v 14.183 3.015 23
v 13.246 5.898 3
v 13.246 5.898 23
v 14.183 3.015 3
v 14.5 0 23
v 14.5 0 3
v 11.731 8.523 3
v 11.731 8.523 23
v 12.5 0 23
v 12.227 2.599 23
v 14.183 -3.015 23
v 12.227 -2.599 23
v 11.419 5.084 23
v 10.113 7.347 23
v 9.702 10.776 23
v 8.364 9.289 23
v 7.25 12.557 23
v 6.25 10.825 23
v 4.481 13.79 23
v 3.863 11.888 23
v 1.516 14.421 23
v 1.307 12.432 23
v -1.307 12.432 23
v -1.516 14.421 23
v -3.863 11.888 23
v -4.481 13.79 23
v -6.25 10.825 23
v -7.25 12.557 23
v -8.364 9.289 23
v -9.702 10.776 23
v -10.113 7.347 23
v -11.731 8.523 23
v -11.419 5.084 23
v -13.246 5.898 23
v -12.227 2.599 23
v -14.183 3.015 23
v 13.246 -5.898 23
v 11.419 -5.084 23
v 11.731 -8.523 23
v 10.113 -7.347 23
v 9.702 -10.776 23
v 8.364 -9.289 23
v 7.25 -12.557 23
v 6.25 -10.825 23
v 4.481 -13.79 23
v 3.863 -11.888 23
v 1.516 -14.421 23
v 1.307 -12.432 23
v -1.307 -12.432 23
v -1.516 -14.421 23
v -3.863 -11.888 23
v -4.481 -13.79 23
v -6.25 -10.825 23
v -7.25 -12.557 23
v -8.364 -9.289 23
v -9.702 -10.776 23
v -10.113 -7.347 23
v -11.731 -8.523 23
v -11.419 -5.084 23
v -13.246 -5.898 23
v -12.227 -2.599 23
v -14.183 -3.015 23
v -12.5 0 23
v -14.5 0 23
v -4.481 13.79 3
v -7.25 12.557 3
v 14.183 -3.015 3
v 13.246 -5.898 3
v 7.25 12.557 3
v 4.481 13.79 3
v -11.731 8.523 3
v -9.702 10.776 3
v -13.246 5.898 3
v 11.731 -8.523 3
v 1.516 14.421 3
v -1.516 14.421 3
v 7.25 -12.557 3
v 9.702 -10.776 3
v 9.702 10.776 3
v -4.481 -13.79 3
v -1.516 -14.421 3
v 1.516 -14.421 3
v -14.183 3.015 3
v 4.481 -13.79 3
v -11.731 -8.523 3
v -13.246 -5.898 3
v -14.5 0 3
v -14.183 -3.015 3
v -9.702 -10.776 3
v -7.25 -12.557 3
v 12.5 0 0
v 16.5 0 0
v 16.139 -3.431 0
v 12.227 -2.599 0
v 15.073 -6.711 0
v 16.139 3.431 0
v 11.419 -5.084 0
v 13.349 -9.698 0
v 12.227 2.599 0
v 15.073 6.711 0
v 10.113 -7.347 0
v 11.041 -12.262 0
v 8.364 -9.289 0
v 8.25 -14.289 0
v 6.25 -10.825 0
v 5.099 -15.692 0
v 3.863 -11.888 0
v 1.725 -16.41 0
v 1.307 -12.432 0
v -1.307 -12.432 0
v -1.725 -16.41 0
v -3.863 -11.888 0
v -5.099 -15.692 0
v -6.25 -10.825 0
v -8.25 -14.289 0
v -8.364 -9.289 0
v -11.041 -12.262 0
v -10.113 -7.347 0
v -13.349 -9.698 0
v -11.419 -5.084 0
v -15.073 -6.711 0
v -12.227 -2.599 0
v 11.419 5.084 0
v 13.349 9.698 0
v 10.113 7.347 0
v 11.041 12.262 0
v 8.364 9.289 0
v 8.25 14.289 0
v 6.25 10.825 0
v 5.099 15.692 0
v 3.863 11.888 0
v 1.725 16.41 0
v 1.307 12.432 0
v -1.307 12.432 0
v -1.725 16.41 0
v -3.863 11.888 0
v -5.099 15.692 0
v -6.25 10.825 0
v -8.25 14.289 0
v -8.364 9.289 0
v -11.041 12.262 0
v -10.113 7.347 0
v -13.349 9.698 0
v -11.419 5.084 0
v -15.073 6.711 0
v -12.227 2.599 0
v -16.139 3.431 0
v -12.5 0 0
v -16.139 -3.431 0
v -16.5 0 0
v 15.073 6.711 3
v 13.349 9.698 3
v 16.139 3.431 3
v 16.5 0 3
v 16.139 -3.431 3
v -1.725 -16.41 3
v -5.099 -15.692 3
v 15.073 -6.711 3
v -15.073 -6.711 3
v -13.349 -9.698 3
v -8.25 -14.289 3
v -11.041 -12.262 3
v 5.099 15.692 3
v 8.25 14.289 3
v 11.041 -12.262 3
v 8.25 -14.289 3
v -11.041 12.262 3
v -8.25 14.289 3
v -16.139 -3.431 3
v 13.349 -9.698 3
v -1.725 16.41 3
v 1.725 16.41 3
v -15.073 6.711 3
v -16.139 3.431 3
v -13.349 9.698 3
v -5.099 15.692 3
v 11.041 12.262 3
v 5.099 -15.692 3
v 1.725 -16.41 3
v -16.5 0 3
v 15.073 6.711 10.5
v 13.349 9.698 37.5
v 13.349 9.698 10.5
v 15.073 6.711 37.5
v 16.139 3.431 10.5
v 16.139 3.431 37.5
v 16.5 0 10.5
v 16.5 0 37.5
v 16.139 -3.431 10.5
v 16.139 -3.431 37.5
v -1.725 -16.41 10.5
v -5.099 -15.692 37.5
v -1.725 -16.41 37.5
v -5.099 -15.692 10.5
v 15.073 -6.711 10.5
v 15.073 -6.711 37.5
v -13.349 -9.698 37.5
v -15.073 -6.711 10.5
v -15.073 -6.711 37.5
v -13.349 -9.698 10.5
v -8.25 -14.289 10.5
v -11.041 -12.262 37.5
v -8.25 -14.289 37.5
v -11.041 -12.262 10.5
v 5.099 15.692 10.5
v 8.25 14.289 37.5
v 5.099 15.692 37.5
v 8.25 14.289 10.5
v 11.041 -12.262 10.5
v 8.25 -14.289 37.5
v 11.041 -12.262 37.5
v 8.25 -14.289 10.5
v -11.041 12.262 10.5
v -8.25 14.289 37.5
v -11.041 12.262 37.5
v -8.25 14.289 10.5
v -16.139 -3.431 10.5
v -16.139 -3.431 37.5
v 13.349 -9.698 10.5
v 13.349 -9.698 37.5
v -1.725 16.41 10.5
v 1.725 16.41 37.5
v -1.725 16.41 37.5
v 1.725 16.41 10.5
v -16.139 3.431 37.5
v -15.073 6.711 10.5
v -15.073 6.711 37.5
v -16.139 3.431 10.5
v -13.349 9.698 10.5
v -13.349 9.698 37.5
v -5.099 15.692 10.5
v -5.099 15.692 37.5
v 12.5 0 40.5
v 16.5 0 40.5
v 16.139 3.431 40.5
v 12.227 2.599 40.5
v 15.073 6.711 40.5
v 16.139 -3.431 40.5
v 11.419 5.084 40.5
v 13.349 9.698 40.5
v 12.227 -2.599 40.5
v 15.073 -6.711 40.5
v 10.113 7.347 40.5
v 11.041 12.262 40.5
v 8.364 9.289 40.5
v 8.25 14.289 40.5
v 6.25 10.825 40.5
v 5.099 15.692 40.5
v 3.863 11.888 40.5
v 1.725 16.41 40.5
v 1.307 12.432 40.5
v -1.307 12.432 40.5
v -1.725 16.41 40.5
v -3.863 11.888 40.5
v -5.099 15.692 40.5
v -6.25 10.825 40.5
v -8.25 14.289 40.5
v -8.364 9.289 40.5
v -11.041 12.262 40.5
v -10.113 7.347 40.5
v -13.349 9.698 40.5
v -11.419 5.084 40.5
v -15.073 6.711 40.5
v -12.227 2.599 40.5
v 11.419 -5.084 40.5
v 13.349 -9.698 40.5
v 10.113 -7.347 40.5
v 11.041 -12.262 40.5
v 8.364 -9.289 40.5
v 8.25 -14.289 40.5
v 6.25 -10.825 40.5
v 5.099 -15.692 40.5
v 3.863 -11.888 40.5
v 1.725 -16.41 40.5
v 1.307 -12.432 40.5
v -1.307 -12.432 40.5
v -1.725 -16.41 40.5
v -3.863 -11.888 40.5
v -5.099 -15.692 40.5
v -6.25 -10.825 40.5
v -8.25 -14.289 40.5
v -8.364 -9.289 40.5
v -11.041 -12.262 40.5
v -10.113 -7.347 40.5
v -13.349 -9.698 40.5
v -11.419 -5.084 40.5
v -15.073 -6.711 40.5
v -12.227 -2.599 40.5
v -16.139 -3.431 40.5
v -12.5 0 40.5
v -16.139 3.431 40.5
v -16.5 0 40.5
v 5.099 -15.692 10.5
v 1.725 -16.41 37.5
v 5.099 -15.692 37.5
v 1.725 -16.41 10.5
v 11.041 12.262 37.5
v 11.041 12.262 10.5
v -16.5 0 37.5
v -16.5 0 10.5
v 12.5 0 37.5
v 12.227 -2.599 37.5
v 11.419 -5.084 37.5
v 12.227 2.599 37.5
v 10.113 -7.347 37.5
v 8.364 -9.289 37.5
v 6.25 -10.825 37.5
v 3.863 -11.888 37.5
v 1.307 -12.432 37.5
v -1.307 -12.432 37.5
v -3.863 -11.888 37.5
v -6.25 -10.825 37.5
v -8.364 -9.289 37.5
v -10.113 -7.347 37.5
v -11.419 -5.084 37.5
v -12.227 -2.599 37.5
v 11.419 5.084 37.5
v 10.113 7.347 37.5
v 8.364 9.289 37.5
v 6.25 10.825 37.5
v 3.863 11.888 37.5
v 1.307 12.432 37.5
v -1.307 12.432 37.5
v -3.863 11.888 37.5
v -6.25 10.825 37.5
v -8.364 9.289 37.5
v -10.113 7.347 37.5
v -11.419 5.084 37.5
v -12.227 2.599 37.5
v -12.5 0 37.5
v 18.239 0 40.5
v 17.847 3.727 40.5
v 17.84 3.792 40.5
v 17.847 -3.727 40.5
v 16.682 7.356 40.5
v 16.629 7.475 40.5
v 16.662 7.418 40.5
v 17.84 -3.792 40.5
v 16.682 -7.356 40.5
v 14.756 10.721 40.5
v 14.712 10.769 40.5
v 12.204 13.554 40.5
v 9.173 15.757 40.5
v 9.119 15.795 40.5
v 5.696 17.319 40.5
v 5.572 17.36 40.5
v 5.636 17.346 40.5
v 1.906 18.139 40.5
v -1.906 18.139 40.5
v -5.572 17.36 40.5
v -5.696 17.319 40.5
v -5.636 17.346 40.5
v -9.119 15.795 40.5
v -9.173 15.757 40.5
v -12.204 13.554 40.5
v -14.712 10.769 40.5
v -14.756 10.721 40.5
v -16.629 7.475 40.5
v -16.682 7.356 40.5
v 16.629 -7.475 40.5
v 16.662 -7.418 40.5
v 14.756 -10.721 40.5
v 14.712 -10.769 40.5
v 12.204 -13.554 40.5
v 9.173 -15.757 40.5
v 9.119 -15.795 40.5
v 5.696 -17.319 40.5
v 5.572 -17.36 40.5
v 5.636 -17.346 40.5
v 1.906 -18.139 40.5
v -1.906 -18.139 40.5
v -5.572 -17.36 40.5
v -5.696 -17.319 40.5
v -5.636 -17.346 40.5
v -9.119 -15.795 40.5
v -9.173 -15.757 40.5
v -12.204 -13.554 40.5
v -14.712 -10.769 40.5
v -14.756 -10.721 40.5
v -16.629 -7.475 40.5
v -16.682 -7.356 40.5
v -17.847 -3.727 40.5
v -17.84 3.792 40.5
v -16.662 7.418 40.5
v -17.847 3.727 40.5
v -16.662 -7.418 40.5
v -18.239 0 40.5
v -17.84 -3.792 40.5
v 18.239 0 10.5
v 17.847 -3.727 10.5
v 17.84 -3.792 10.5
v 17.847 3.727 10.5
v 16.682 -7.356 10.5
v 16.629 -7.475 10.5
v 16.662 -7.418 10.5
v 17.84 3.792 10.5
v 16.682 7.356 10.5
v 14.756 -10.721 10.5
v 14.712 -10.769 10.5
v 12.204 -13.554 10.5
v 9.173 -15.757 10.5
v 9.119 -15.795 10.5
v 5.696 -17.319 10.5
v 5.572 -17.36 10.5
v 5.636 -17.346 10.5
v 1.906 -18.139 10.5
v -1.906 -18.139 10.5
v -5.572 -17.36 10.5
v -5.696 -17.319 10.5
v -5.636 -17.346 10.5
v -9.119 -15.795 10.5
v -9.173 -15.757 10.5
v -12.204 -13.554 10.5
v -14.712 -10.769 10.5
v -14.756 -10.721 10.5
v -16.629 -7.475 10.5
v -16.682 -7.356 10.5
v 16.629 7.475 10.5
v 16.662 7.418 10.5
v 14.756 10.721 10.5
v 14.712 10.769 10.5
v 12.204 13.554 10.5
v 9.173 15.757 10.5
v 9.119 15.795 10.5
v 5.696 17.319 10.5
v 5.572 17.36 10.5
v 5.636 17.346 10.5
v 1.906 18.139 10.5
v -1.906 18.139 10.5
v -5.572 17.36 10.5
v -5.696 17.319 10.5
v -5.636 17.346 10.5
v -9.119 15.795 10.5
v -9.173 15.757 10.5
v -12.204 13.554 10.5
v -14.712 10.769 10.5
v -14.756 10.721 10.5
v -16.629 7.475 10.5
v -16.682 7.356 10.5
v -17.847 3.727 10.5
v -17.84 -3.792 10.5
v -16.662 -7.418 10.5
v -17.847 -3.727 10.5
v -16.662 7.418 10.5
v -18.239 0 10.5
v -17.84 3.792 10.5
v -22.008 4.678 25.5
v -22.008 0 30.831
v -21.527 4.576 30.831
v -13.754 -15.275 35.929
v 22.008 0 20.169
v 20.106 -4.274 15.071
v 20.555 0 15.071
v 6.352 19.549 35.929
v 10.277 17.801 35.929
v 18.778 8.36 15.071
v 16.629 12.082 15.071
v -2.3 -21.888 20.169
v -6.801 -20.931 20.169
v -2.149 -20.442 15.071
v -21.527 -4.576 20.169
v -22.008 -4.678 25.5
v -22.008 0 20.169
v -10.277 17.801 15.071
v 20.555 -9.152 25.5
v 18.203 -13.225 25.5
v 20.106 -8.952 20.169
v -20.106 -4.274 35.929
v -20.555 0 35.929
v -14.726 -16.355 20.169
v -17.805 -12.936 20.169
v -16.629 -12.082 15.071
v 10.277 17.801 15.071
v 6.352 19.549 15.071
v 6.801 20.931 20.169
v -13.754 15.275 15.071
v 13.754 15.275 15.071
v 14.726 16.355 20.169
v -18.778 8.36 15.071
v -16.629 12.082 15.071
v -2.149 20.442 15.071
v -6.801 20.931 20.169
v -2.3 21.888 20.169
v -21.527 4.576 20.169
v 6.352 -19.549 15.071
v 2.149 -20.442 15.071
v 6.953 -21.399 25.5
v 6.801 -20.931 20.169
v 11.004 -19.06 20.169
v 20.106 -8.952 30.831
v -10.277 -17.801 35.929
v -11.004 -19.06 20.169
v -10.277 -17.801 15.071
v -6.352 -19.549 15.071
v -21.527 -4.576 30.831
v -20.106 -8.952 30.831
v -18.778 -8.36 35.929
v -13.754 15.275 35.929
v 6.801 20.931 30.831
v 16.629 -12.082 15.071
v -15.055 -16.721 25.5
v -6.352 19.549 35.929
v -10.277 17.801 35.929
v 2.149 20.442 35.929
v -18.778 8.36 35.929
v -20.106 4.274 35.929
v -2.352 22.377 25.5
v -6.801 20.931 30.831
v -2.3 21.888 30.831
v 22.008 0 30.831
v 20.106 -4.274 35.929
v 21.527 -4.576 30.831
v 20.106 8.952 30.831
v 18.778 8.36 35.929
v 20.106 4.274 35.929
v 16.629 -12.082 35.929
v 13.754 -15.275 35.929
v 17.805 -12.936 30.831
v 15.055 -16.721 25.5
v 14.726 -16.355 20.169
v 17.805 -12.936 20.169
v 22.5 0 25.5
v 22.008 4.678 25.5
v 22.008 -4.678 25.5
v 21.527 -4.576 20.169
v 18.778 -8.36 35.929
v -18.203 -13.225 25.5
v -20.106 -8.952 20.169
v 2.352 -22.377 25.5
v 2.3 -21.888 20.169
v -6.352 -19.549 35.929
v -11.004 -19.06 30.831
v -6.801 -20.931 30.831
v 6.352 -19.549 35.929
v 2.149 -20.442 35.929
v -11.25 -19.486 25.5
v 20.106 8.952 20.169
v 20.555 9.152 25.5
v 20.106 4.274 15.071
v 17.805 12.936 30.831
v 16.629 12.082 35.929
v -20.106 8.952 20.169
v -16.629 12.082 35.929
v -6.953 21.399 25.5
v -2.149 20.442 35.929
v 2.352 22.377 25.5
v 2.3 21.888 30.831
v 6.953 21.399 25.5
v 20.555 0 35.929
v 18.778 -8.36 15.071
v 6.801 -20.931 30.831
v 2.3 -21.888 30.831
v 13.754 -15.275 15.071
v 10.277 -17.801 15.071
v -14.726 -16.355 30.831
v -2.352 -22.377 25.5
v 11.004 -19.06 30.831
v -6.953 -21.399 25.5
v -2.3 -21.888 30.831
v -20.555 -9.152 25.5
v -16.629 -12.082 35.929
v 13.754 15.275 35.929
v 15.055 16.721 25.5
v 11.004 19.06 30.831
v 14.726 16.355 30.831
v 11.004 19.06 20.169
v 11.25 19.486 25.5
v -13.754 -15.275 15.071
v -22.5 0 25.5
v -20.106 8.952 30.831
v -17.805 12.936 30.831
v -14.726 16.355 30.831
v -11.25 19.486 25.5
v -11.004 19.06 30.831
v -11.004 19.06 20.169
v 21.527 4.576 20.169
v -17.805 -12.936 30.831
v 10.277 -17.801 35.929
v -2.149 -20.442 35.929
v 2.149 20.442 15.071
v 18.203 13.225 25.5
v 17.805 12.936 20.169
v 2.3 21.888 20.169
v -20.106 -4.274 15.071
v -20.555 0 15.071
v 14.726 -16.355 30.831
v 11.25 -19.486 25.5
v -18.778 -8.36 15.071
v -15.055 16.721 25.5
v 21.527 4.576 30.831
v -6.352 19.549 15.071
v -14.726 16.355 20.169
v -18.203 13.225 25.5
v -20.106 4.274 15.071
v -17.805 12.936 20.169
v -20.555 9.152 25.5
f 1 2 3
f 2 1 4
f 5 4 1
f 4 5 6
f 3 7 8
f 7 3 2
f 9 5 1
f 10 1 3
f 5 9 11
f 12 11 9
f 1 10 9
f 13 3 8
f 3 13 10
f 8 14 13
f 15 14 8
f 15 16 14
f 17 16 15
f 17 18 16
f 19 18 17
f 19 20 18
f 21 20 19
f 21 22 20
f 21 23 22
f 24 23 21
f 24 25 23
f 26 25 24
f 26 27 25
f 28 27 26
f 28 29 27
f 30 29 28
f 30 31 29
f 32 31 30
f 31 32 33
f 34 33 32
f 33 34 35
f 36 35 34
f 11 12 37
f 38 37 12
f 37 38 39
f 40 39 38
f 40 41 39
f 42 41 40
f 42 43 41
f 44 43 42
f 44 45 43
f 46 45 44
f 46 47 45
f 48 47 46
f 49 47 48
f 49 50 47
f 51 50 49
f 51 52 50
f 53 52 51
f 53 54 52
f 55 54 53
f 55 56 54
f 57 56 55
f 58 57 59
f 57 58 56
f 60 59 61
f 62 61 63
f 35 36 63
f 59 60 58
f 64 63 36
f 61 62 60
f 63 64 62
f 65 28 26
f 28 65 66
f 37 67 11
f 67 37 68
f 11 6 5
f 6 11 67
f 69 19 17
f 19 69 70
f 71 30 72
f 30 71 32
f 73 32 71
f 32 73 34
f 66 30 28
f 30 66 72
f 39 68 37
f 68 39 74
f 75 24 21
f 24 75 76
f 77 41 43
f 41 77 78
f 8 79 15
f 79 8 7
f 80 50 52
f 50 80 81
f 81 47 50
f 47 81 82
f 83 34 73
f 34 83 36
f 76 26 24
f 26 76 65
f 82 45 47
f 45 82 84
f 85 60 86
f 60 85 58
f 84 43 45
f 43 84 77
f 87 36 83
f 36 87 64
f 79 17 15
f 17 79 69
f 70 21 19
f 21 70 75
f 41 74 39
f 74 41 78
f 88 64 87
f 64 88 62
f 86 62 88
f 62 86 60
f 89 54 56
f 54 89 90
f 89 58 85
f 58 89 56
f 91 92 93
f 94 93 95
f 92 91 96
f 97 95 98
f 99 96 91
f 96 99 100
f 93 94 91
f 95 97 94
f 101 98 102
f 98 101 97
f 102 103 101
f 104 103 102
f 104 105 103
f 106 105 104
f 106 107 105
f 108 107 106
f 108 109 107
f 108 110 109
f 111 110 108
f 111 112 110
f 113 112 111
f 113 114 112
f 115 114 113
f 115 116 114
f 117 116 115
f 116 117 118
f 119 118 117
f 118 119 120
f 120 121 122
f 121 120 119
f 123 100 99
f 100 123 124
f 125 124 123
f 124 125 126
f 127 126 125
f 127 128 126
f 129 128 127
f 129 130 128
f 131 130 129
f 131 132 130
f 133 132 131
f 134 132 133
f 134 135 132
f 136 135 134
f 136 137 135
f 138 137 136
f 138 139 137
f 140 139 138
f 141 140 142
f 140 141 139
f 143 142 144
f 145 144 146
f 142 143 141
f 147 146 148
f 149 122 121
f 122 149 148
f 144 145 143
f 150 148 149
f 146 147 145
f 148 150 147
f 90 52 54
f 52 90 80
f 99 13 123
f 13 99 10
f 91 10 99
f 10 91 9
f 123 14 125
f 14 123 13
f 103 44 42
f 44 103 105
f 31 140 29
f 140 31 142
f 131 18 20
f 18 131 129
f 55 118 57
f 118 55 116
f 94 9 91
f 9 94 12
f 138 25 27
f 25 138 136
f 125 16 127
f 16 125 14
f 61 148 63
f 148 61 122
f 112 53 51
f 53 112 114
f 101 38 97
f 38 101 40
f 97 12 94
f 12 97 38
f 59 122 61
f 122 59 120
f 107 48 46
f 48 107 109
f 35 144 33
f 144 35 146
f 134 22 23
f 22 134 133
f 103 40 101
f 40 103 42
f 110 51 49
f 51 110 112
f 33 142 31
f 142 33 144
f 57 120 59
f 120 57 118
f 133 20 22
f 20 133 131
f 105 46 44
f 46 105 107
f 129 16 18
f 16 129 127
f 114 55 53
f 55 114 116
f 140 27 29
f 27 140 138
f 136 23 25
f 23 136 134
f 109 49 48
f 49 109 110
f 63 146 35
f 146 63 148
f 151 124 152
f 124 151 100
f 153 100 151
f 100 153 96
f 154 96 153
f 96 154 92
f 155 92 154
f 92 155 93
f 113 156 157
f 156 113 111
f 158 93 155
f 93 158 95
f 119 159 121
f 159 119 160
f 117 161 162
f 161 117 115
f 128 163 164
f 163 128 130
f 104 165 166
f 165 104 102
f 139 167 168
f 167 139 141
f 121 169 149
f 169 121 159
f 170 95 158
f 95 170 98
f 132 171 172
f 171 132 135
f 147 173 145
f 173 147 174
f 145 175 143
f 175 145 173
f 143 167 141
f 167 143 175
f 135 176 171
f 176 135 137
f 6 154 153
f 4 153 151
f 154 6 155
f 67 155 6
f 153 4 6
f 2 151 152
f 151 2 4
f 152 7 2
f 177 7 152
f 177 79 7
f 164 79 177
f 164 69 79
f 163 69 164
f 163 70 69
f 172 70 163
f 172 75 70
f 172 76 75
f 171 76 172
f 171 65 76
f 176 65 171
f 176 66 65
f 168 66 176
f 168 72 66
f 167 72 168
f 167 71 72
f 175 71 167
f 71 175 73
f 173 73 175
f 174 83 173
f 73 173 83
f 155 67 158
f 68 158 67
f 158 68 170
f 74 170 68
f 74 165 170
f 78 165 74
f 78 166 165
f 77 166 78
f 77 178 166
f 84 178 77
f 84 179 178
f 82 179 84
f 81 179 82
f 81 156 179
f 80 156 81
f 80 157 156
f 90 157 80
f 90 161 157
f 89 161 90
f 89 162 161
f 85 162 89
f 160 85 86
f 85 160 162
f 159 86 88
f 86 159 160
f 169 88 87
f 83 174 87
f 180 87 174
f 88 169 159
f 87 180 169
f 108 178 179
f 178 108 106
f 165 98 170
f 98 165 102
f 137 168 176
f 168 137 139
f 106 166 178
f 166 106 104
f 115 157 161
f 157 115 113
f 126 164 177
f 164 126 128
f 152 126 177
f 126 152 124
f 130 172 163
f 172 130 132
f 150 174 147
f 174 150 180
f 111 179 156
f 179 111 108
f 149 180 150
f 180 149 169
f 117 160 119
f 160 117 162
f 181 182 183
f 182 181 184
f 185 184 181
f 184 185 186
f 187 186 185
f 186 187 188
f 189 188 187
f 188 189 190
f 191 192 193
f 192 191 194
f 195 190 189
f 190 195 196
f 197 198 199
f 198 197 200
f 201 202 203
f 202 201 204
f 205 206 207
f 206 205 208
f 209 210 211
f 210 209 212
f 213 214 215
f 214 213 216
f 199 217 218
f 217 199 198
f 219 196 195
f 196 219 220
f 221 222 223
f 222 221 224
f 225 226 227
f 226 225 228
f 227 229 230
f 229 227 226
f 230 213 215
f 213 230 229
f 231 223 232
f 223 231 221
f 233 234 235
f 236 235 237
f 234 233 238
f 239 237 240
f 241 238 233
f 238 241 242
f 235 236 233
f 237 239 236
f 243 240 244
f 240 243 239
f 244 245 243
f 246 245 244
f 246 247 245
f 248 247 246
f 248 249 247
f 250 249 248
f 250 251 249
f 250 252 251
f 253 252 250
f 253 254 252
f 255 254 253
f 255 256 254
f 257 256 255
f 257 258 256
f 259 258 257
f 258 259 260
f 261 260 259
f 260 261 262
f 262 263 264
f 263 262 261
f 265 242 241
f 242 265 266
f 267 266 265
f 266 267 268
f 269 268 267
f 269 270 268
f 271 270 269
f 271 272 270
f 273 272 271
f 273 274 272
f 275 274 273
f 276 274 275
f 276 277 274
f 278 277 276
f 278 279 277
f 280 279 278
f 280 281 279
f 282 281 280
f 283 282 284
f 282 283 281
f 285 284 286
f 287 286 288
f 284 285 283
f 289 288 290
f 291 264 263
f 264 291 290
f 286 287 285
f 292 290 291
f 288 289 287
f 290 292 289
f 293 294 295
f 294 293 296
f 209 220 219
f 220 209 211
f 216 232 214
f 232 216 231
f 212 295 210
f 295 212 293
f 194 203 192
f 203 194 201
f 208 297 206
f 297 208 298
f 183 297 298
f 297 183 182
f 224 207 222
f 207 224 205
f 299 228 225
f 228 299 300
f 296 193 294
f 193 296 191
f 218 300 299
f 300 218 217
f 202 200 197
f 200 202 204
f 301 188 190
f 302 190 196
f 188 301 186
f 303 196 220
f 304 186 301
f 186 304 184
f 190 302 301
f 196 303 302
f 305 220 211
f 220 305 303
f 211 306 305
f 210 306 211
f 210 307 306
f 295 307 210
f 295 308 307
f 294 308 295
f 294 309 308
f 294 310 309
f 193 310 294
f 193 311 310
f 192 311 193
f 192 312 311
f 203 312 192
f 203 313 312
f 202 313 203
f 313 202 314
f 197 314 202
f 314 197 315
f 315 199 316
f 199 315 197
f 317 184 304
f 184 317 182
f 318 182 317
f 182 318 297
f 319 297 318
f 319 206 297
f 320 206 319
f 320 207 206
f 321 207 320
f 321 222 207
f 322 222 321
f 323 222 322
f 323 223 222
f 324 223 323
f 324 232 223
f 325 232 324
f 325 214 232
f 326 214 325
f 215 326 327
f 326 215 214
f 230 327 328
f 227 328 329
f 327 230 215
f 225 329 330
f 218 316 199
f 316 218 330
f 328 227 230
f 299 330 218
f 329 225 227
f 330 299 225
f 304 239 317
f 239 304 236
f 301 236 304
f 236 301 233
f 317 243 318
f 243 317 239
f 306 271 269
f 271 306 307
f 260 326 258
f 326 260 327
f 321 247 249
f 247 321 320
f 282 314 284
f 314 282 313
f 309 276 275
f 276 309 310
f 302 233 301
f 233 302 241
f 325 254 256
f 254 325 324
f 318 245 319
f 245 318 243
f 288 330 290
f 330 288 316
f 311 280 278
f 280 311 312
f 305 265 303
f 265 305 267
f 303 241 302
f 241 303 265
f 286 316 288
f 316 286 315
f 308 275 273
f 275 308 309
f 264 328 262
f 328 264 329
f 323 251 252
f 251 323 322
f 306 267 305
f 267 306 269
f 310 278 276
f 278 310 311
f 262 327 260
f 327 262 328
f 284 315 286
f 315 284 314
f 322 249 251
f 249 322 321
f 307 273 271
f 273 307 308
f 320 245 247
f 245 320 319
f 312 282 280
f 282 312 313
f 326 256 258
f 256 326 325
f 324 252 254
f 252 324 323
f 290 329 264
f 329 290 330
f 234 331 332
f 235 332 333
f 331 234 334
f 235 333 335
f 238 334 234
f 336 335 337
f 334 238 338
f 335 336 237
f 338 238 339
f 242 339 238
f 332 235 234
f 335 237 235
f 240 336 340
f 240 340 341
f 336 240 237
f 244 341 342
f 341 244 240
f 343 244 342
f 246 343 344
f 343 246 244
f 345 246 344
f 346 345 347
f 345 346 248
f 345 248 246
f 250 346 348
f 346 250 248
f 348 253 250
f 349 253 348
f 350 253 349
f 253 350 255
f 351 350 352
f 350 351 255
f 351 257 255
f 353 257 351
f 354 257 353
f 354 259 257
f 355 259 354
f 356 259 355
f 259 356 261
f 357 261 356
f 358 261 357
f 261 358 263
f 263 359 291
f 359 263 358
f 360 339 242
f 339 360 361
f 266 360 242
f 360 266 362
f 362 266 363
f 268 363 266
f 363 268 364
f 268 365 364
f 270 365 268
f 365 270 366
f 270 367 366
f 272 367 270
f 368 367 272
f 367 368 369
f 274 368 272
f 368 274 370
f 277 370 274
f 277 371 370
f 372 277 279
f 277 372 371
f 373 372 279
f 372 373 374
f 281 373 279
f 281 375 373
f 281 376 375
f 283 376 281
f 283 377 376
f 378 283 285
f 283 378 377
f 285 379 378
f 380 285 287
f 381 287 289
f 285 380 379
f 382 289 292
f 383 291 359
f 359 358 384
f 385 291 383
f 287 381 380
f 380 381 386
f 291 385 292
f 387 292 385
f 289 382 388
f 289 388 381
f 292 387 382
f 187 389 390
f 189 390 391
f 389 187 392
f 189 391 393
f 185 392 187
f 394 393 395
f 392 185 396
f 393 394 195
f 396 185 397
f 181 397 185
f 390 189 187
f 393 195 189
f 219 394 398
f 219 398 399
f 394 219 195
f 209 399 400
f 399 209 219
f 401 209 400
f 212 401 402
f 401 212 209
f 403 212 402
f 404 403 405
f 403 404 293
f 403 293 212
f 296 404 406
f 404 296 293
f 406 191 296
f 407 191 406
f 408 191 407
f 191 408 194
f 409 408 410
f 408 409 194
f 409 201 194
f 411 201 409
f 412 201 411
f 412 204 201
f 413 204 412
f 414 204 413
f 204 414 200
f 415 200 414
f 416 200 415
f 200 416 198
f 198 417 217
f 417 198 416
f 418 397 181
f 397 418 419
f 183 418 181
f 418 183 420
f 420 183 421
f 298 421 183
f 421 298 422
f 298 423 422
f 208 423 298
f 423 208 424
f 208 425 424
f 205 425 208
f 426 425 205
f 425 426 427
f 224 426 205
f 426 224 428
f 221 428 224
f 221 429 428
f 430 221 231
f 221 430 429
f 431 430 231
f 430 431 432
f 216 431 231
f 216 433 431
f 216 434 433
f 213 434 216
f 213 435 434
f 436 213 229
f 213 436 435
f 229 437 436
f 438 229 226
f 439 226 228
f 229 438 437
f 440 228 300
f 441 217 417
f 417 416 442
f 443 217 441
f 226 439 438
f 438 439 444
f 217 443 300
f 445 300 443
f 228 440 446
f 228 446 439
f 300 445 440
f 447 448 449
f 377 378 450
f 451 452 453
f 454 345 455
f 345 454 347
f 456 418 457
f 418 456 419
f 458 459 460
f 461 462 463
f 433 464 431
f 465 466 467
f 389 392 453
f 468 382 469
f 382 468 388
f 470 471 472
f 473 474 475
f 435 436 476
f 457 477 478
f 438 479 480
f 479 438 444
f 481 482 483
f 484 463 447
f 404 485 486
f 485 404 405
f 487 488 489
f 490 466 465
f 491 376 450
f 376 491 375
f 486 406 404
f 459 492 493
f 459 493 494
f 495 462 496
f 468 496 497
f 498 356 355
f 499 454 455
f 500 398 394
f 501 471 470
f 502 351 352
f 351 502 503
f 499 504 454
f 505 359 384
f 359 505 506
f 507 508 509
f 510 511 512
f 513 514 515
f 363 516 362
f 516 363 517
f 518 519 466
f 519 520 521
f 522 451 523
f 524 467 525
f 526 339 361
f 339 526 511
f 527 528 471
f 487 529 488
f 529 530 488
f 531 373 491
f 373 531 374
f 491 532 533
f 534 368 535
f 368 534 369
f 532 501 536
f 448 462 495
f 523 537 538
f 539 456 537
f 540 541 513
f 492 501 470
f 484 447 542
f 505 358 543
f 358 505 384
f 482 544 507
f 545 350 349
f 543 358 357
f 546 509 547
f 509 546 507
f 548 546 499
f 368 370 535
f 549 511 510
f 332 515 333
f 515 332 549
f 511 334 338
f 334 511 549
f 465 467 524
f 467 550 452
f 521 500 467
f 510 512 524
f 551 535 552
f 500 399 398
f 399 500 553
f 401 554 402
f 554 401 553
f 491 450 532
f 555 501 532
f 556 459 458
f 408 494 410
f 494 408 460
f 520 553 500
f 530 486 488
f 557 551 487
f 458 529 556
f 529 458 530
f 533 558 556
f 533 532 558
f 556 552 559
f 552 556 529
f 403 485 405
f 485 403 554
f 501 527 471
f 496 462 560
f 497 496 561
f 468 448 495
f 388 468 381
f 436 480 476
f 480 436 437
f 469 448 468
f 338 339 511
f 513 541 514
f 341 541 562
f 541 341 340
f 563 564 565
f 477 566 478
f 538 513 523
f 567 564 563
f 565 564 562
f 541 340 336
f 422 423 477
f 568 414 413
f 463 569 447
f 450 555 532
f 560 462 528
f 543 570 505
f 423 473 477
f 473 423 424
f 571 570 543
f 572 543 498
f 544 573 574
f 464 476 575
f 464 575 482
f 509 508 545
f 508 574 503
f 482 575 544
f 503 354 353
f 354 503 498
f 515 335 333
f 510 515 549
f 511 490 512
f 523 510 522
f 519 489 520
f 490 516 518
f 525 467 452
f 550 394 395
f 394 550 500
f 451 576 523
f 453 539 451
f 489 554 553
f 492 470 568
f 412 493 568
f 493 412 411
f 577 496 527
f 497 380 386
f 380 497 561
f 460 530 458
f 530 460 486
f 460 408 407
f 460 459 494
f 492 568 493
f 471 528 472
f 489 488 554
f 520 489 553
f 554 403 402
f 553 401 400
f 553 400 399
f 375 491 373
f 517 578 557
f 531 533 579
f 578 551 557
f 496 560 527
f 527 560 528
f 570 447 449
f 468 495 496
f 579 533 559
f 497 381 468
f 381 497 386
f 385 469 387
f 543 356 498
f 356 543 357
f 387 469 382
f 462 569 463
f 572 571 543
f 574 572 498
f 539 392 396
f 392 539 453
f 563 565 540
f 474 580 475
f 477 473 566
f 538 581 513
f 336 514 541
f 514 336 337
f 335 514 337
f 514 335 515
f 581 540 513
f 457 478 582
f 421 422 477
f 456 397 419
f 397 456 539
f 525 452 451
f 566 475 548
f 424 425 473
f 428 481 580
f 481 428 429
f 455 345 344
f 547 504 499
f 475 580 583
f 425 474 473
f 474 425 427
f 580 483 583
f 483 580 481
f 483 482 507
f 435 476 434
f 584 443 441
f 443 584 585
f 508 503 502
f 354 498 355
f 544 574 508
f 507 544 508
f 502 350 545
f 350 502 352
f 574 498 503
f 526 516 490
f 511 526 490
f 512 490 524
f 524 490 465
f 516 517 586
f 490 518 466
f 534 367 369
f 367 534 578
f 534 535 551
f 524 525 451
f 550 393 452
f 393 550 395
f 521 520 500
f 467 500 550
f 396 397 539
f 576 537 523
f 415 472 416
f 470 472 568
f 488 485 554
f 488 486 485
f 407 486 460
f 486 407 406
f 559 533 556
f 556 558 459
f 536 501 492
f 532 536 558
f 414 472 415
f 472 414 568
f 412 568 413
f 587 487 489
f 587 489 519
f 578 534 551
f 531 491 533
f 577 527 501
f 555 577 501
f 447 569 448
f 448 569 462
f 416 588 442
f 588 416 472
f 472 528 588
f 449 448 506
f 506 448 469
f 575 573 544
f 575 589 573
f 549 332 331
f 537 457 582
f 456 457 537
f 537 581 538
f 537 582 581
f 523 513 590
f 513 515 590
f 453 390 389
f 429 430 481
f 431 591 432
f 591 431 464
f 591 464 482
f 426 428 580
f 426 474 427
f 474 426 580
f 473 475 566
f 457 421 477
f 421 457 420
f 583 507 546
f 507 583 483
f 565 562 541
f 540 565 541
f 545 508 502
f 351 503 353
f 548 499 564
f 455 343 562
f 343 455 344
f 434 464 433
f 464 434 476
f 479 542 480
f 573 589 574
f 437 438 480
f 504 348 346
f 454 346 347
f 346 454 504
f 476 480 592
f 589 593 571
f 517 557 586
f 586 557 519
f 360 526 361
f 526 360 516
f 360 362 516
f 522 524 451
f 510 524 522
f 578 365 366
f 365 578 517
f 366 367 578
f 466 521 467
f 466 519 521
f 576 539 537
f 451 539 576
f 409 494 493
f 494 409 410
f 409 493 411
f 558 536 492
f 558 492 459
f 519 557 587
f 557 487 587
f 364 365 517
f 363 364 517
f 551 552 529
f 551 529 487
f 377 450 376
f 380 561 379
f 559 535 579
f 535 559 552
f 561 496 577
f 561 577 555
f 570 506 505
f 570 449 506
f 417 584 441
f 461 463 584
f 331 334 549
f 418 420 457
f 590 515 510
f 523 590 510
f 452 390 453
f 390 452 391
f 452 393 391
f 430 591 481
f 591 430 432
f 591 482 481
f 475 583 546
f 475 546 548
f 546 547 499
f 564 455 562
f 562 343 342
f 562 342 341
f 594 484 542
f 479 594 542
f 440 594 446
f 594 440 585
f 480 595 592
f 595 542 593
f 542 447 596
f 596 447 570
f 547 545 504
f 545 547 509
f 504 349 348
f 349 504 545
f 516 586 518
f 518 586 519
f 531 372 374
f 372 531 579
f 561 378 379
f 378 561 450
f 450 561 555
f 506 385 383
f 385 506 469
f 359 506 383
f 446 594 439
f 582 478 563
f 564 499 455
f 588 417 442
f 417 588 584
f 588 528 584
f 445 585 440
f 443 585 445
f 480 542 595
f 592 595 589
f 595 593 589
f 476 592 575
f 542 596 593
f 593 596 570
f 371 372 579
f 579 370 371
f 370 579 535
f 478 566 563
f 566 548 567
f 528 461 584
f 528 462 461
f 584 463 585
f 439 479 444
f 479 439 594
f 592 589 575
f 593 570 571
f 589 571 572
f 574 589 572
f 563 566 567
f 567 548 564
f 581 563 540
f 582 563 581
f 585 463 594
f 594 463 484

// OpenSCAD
/*Leone Ermer
Faucet Drinking Fountain
2013 3D Fabrication

Notes:
	Make Faucet Attachment infill normal
	Make Fountain infill zero

To Do List:
	Print
	Make Spout
	Figure out Sizing and Print Controls
*/

//
//Basic Controls
//
	//Display Parts
		faucetAttachment = true;
		fountain = true;

	//Faucet Attachment (Thermochromic PLA)
		faucetDiameter = 25; //Diameter of inner circle
		attachmentHeight = 23;
		attachmentThickness = 2;
		
	//Fountain (Soft PLA)
		fountainHeight = 30;
		fountainWidth = 45;
			
//
//Secondary Controls
//
	//Connecter Ridge
		ridgeThickness = 2;
		ridgeHeight = 3;
	
	
	//Don't Touch
		faucetRadius = (faucetDiameter/2);
		faRadius = (faucetRadius + attachmentThickness);
		ridgeRadius = (faRadius+ ridgeThickness);
		fountainRadius = (fountainWidth/2);
		fountainOval = (fountainHeight + ((fountainHeight)*.7));
		fountainCutoffs = ((fountainHeight*.7)/2);
		
//	
//Build
//

if(faucetAttachment == true){
	faucetAttachment();
	connecterRidge();
}

if(fountain == true){
	translate([0,0,(fountainHeight+fountainCutoffs-ridgeHeight)])
	connecterRidge();
	fountain();
}

//
// Modules
//

module faucetAttachment(){
	difference(){
		cylinder(attachmentHeight,faRadius,faRadius);
		cylinder(attachmentHeight,faucetRadius,faucetRadius);
	}
}

module connecterRidge(){
	difference(){
		cylinder(ridgeHeight,ridgeRadius,ridgeRadius);
		cylinder(ridgeHeight,faucetRadius,faucetRadius);
	}
}

module fountain(){
	difference(){
		translate([0,0,(fountainOval/2)]) resize([0,0,fountainOval]) 
		sphere(fountainRadius);
		fountainCutouts();
	}
}

module fountainCutouts(){
		translate([0,0,(fountainCutoffs)])
		cylinder(fountainHeight,ridgeRadius,ridgeRadius); //Inner Cylinder
		cylinder(fountainCutoffs,60,60); //Bottom Cutout
		translate([0,0,(fountainOval-fountainCutoffs)]) 
		cylinder(fountainCutoffs,60,60); //Top Cutout
}
